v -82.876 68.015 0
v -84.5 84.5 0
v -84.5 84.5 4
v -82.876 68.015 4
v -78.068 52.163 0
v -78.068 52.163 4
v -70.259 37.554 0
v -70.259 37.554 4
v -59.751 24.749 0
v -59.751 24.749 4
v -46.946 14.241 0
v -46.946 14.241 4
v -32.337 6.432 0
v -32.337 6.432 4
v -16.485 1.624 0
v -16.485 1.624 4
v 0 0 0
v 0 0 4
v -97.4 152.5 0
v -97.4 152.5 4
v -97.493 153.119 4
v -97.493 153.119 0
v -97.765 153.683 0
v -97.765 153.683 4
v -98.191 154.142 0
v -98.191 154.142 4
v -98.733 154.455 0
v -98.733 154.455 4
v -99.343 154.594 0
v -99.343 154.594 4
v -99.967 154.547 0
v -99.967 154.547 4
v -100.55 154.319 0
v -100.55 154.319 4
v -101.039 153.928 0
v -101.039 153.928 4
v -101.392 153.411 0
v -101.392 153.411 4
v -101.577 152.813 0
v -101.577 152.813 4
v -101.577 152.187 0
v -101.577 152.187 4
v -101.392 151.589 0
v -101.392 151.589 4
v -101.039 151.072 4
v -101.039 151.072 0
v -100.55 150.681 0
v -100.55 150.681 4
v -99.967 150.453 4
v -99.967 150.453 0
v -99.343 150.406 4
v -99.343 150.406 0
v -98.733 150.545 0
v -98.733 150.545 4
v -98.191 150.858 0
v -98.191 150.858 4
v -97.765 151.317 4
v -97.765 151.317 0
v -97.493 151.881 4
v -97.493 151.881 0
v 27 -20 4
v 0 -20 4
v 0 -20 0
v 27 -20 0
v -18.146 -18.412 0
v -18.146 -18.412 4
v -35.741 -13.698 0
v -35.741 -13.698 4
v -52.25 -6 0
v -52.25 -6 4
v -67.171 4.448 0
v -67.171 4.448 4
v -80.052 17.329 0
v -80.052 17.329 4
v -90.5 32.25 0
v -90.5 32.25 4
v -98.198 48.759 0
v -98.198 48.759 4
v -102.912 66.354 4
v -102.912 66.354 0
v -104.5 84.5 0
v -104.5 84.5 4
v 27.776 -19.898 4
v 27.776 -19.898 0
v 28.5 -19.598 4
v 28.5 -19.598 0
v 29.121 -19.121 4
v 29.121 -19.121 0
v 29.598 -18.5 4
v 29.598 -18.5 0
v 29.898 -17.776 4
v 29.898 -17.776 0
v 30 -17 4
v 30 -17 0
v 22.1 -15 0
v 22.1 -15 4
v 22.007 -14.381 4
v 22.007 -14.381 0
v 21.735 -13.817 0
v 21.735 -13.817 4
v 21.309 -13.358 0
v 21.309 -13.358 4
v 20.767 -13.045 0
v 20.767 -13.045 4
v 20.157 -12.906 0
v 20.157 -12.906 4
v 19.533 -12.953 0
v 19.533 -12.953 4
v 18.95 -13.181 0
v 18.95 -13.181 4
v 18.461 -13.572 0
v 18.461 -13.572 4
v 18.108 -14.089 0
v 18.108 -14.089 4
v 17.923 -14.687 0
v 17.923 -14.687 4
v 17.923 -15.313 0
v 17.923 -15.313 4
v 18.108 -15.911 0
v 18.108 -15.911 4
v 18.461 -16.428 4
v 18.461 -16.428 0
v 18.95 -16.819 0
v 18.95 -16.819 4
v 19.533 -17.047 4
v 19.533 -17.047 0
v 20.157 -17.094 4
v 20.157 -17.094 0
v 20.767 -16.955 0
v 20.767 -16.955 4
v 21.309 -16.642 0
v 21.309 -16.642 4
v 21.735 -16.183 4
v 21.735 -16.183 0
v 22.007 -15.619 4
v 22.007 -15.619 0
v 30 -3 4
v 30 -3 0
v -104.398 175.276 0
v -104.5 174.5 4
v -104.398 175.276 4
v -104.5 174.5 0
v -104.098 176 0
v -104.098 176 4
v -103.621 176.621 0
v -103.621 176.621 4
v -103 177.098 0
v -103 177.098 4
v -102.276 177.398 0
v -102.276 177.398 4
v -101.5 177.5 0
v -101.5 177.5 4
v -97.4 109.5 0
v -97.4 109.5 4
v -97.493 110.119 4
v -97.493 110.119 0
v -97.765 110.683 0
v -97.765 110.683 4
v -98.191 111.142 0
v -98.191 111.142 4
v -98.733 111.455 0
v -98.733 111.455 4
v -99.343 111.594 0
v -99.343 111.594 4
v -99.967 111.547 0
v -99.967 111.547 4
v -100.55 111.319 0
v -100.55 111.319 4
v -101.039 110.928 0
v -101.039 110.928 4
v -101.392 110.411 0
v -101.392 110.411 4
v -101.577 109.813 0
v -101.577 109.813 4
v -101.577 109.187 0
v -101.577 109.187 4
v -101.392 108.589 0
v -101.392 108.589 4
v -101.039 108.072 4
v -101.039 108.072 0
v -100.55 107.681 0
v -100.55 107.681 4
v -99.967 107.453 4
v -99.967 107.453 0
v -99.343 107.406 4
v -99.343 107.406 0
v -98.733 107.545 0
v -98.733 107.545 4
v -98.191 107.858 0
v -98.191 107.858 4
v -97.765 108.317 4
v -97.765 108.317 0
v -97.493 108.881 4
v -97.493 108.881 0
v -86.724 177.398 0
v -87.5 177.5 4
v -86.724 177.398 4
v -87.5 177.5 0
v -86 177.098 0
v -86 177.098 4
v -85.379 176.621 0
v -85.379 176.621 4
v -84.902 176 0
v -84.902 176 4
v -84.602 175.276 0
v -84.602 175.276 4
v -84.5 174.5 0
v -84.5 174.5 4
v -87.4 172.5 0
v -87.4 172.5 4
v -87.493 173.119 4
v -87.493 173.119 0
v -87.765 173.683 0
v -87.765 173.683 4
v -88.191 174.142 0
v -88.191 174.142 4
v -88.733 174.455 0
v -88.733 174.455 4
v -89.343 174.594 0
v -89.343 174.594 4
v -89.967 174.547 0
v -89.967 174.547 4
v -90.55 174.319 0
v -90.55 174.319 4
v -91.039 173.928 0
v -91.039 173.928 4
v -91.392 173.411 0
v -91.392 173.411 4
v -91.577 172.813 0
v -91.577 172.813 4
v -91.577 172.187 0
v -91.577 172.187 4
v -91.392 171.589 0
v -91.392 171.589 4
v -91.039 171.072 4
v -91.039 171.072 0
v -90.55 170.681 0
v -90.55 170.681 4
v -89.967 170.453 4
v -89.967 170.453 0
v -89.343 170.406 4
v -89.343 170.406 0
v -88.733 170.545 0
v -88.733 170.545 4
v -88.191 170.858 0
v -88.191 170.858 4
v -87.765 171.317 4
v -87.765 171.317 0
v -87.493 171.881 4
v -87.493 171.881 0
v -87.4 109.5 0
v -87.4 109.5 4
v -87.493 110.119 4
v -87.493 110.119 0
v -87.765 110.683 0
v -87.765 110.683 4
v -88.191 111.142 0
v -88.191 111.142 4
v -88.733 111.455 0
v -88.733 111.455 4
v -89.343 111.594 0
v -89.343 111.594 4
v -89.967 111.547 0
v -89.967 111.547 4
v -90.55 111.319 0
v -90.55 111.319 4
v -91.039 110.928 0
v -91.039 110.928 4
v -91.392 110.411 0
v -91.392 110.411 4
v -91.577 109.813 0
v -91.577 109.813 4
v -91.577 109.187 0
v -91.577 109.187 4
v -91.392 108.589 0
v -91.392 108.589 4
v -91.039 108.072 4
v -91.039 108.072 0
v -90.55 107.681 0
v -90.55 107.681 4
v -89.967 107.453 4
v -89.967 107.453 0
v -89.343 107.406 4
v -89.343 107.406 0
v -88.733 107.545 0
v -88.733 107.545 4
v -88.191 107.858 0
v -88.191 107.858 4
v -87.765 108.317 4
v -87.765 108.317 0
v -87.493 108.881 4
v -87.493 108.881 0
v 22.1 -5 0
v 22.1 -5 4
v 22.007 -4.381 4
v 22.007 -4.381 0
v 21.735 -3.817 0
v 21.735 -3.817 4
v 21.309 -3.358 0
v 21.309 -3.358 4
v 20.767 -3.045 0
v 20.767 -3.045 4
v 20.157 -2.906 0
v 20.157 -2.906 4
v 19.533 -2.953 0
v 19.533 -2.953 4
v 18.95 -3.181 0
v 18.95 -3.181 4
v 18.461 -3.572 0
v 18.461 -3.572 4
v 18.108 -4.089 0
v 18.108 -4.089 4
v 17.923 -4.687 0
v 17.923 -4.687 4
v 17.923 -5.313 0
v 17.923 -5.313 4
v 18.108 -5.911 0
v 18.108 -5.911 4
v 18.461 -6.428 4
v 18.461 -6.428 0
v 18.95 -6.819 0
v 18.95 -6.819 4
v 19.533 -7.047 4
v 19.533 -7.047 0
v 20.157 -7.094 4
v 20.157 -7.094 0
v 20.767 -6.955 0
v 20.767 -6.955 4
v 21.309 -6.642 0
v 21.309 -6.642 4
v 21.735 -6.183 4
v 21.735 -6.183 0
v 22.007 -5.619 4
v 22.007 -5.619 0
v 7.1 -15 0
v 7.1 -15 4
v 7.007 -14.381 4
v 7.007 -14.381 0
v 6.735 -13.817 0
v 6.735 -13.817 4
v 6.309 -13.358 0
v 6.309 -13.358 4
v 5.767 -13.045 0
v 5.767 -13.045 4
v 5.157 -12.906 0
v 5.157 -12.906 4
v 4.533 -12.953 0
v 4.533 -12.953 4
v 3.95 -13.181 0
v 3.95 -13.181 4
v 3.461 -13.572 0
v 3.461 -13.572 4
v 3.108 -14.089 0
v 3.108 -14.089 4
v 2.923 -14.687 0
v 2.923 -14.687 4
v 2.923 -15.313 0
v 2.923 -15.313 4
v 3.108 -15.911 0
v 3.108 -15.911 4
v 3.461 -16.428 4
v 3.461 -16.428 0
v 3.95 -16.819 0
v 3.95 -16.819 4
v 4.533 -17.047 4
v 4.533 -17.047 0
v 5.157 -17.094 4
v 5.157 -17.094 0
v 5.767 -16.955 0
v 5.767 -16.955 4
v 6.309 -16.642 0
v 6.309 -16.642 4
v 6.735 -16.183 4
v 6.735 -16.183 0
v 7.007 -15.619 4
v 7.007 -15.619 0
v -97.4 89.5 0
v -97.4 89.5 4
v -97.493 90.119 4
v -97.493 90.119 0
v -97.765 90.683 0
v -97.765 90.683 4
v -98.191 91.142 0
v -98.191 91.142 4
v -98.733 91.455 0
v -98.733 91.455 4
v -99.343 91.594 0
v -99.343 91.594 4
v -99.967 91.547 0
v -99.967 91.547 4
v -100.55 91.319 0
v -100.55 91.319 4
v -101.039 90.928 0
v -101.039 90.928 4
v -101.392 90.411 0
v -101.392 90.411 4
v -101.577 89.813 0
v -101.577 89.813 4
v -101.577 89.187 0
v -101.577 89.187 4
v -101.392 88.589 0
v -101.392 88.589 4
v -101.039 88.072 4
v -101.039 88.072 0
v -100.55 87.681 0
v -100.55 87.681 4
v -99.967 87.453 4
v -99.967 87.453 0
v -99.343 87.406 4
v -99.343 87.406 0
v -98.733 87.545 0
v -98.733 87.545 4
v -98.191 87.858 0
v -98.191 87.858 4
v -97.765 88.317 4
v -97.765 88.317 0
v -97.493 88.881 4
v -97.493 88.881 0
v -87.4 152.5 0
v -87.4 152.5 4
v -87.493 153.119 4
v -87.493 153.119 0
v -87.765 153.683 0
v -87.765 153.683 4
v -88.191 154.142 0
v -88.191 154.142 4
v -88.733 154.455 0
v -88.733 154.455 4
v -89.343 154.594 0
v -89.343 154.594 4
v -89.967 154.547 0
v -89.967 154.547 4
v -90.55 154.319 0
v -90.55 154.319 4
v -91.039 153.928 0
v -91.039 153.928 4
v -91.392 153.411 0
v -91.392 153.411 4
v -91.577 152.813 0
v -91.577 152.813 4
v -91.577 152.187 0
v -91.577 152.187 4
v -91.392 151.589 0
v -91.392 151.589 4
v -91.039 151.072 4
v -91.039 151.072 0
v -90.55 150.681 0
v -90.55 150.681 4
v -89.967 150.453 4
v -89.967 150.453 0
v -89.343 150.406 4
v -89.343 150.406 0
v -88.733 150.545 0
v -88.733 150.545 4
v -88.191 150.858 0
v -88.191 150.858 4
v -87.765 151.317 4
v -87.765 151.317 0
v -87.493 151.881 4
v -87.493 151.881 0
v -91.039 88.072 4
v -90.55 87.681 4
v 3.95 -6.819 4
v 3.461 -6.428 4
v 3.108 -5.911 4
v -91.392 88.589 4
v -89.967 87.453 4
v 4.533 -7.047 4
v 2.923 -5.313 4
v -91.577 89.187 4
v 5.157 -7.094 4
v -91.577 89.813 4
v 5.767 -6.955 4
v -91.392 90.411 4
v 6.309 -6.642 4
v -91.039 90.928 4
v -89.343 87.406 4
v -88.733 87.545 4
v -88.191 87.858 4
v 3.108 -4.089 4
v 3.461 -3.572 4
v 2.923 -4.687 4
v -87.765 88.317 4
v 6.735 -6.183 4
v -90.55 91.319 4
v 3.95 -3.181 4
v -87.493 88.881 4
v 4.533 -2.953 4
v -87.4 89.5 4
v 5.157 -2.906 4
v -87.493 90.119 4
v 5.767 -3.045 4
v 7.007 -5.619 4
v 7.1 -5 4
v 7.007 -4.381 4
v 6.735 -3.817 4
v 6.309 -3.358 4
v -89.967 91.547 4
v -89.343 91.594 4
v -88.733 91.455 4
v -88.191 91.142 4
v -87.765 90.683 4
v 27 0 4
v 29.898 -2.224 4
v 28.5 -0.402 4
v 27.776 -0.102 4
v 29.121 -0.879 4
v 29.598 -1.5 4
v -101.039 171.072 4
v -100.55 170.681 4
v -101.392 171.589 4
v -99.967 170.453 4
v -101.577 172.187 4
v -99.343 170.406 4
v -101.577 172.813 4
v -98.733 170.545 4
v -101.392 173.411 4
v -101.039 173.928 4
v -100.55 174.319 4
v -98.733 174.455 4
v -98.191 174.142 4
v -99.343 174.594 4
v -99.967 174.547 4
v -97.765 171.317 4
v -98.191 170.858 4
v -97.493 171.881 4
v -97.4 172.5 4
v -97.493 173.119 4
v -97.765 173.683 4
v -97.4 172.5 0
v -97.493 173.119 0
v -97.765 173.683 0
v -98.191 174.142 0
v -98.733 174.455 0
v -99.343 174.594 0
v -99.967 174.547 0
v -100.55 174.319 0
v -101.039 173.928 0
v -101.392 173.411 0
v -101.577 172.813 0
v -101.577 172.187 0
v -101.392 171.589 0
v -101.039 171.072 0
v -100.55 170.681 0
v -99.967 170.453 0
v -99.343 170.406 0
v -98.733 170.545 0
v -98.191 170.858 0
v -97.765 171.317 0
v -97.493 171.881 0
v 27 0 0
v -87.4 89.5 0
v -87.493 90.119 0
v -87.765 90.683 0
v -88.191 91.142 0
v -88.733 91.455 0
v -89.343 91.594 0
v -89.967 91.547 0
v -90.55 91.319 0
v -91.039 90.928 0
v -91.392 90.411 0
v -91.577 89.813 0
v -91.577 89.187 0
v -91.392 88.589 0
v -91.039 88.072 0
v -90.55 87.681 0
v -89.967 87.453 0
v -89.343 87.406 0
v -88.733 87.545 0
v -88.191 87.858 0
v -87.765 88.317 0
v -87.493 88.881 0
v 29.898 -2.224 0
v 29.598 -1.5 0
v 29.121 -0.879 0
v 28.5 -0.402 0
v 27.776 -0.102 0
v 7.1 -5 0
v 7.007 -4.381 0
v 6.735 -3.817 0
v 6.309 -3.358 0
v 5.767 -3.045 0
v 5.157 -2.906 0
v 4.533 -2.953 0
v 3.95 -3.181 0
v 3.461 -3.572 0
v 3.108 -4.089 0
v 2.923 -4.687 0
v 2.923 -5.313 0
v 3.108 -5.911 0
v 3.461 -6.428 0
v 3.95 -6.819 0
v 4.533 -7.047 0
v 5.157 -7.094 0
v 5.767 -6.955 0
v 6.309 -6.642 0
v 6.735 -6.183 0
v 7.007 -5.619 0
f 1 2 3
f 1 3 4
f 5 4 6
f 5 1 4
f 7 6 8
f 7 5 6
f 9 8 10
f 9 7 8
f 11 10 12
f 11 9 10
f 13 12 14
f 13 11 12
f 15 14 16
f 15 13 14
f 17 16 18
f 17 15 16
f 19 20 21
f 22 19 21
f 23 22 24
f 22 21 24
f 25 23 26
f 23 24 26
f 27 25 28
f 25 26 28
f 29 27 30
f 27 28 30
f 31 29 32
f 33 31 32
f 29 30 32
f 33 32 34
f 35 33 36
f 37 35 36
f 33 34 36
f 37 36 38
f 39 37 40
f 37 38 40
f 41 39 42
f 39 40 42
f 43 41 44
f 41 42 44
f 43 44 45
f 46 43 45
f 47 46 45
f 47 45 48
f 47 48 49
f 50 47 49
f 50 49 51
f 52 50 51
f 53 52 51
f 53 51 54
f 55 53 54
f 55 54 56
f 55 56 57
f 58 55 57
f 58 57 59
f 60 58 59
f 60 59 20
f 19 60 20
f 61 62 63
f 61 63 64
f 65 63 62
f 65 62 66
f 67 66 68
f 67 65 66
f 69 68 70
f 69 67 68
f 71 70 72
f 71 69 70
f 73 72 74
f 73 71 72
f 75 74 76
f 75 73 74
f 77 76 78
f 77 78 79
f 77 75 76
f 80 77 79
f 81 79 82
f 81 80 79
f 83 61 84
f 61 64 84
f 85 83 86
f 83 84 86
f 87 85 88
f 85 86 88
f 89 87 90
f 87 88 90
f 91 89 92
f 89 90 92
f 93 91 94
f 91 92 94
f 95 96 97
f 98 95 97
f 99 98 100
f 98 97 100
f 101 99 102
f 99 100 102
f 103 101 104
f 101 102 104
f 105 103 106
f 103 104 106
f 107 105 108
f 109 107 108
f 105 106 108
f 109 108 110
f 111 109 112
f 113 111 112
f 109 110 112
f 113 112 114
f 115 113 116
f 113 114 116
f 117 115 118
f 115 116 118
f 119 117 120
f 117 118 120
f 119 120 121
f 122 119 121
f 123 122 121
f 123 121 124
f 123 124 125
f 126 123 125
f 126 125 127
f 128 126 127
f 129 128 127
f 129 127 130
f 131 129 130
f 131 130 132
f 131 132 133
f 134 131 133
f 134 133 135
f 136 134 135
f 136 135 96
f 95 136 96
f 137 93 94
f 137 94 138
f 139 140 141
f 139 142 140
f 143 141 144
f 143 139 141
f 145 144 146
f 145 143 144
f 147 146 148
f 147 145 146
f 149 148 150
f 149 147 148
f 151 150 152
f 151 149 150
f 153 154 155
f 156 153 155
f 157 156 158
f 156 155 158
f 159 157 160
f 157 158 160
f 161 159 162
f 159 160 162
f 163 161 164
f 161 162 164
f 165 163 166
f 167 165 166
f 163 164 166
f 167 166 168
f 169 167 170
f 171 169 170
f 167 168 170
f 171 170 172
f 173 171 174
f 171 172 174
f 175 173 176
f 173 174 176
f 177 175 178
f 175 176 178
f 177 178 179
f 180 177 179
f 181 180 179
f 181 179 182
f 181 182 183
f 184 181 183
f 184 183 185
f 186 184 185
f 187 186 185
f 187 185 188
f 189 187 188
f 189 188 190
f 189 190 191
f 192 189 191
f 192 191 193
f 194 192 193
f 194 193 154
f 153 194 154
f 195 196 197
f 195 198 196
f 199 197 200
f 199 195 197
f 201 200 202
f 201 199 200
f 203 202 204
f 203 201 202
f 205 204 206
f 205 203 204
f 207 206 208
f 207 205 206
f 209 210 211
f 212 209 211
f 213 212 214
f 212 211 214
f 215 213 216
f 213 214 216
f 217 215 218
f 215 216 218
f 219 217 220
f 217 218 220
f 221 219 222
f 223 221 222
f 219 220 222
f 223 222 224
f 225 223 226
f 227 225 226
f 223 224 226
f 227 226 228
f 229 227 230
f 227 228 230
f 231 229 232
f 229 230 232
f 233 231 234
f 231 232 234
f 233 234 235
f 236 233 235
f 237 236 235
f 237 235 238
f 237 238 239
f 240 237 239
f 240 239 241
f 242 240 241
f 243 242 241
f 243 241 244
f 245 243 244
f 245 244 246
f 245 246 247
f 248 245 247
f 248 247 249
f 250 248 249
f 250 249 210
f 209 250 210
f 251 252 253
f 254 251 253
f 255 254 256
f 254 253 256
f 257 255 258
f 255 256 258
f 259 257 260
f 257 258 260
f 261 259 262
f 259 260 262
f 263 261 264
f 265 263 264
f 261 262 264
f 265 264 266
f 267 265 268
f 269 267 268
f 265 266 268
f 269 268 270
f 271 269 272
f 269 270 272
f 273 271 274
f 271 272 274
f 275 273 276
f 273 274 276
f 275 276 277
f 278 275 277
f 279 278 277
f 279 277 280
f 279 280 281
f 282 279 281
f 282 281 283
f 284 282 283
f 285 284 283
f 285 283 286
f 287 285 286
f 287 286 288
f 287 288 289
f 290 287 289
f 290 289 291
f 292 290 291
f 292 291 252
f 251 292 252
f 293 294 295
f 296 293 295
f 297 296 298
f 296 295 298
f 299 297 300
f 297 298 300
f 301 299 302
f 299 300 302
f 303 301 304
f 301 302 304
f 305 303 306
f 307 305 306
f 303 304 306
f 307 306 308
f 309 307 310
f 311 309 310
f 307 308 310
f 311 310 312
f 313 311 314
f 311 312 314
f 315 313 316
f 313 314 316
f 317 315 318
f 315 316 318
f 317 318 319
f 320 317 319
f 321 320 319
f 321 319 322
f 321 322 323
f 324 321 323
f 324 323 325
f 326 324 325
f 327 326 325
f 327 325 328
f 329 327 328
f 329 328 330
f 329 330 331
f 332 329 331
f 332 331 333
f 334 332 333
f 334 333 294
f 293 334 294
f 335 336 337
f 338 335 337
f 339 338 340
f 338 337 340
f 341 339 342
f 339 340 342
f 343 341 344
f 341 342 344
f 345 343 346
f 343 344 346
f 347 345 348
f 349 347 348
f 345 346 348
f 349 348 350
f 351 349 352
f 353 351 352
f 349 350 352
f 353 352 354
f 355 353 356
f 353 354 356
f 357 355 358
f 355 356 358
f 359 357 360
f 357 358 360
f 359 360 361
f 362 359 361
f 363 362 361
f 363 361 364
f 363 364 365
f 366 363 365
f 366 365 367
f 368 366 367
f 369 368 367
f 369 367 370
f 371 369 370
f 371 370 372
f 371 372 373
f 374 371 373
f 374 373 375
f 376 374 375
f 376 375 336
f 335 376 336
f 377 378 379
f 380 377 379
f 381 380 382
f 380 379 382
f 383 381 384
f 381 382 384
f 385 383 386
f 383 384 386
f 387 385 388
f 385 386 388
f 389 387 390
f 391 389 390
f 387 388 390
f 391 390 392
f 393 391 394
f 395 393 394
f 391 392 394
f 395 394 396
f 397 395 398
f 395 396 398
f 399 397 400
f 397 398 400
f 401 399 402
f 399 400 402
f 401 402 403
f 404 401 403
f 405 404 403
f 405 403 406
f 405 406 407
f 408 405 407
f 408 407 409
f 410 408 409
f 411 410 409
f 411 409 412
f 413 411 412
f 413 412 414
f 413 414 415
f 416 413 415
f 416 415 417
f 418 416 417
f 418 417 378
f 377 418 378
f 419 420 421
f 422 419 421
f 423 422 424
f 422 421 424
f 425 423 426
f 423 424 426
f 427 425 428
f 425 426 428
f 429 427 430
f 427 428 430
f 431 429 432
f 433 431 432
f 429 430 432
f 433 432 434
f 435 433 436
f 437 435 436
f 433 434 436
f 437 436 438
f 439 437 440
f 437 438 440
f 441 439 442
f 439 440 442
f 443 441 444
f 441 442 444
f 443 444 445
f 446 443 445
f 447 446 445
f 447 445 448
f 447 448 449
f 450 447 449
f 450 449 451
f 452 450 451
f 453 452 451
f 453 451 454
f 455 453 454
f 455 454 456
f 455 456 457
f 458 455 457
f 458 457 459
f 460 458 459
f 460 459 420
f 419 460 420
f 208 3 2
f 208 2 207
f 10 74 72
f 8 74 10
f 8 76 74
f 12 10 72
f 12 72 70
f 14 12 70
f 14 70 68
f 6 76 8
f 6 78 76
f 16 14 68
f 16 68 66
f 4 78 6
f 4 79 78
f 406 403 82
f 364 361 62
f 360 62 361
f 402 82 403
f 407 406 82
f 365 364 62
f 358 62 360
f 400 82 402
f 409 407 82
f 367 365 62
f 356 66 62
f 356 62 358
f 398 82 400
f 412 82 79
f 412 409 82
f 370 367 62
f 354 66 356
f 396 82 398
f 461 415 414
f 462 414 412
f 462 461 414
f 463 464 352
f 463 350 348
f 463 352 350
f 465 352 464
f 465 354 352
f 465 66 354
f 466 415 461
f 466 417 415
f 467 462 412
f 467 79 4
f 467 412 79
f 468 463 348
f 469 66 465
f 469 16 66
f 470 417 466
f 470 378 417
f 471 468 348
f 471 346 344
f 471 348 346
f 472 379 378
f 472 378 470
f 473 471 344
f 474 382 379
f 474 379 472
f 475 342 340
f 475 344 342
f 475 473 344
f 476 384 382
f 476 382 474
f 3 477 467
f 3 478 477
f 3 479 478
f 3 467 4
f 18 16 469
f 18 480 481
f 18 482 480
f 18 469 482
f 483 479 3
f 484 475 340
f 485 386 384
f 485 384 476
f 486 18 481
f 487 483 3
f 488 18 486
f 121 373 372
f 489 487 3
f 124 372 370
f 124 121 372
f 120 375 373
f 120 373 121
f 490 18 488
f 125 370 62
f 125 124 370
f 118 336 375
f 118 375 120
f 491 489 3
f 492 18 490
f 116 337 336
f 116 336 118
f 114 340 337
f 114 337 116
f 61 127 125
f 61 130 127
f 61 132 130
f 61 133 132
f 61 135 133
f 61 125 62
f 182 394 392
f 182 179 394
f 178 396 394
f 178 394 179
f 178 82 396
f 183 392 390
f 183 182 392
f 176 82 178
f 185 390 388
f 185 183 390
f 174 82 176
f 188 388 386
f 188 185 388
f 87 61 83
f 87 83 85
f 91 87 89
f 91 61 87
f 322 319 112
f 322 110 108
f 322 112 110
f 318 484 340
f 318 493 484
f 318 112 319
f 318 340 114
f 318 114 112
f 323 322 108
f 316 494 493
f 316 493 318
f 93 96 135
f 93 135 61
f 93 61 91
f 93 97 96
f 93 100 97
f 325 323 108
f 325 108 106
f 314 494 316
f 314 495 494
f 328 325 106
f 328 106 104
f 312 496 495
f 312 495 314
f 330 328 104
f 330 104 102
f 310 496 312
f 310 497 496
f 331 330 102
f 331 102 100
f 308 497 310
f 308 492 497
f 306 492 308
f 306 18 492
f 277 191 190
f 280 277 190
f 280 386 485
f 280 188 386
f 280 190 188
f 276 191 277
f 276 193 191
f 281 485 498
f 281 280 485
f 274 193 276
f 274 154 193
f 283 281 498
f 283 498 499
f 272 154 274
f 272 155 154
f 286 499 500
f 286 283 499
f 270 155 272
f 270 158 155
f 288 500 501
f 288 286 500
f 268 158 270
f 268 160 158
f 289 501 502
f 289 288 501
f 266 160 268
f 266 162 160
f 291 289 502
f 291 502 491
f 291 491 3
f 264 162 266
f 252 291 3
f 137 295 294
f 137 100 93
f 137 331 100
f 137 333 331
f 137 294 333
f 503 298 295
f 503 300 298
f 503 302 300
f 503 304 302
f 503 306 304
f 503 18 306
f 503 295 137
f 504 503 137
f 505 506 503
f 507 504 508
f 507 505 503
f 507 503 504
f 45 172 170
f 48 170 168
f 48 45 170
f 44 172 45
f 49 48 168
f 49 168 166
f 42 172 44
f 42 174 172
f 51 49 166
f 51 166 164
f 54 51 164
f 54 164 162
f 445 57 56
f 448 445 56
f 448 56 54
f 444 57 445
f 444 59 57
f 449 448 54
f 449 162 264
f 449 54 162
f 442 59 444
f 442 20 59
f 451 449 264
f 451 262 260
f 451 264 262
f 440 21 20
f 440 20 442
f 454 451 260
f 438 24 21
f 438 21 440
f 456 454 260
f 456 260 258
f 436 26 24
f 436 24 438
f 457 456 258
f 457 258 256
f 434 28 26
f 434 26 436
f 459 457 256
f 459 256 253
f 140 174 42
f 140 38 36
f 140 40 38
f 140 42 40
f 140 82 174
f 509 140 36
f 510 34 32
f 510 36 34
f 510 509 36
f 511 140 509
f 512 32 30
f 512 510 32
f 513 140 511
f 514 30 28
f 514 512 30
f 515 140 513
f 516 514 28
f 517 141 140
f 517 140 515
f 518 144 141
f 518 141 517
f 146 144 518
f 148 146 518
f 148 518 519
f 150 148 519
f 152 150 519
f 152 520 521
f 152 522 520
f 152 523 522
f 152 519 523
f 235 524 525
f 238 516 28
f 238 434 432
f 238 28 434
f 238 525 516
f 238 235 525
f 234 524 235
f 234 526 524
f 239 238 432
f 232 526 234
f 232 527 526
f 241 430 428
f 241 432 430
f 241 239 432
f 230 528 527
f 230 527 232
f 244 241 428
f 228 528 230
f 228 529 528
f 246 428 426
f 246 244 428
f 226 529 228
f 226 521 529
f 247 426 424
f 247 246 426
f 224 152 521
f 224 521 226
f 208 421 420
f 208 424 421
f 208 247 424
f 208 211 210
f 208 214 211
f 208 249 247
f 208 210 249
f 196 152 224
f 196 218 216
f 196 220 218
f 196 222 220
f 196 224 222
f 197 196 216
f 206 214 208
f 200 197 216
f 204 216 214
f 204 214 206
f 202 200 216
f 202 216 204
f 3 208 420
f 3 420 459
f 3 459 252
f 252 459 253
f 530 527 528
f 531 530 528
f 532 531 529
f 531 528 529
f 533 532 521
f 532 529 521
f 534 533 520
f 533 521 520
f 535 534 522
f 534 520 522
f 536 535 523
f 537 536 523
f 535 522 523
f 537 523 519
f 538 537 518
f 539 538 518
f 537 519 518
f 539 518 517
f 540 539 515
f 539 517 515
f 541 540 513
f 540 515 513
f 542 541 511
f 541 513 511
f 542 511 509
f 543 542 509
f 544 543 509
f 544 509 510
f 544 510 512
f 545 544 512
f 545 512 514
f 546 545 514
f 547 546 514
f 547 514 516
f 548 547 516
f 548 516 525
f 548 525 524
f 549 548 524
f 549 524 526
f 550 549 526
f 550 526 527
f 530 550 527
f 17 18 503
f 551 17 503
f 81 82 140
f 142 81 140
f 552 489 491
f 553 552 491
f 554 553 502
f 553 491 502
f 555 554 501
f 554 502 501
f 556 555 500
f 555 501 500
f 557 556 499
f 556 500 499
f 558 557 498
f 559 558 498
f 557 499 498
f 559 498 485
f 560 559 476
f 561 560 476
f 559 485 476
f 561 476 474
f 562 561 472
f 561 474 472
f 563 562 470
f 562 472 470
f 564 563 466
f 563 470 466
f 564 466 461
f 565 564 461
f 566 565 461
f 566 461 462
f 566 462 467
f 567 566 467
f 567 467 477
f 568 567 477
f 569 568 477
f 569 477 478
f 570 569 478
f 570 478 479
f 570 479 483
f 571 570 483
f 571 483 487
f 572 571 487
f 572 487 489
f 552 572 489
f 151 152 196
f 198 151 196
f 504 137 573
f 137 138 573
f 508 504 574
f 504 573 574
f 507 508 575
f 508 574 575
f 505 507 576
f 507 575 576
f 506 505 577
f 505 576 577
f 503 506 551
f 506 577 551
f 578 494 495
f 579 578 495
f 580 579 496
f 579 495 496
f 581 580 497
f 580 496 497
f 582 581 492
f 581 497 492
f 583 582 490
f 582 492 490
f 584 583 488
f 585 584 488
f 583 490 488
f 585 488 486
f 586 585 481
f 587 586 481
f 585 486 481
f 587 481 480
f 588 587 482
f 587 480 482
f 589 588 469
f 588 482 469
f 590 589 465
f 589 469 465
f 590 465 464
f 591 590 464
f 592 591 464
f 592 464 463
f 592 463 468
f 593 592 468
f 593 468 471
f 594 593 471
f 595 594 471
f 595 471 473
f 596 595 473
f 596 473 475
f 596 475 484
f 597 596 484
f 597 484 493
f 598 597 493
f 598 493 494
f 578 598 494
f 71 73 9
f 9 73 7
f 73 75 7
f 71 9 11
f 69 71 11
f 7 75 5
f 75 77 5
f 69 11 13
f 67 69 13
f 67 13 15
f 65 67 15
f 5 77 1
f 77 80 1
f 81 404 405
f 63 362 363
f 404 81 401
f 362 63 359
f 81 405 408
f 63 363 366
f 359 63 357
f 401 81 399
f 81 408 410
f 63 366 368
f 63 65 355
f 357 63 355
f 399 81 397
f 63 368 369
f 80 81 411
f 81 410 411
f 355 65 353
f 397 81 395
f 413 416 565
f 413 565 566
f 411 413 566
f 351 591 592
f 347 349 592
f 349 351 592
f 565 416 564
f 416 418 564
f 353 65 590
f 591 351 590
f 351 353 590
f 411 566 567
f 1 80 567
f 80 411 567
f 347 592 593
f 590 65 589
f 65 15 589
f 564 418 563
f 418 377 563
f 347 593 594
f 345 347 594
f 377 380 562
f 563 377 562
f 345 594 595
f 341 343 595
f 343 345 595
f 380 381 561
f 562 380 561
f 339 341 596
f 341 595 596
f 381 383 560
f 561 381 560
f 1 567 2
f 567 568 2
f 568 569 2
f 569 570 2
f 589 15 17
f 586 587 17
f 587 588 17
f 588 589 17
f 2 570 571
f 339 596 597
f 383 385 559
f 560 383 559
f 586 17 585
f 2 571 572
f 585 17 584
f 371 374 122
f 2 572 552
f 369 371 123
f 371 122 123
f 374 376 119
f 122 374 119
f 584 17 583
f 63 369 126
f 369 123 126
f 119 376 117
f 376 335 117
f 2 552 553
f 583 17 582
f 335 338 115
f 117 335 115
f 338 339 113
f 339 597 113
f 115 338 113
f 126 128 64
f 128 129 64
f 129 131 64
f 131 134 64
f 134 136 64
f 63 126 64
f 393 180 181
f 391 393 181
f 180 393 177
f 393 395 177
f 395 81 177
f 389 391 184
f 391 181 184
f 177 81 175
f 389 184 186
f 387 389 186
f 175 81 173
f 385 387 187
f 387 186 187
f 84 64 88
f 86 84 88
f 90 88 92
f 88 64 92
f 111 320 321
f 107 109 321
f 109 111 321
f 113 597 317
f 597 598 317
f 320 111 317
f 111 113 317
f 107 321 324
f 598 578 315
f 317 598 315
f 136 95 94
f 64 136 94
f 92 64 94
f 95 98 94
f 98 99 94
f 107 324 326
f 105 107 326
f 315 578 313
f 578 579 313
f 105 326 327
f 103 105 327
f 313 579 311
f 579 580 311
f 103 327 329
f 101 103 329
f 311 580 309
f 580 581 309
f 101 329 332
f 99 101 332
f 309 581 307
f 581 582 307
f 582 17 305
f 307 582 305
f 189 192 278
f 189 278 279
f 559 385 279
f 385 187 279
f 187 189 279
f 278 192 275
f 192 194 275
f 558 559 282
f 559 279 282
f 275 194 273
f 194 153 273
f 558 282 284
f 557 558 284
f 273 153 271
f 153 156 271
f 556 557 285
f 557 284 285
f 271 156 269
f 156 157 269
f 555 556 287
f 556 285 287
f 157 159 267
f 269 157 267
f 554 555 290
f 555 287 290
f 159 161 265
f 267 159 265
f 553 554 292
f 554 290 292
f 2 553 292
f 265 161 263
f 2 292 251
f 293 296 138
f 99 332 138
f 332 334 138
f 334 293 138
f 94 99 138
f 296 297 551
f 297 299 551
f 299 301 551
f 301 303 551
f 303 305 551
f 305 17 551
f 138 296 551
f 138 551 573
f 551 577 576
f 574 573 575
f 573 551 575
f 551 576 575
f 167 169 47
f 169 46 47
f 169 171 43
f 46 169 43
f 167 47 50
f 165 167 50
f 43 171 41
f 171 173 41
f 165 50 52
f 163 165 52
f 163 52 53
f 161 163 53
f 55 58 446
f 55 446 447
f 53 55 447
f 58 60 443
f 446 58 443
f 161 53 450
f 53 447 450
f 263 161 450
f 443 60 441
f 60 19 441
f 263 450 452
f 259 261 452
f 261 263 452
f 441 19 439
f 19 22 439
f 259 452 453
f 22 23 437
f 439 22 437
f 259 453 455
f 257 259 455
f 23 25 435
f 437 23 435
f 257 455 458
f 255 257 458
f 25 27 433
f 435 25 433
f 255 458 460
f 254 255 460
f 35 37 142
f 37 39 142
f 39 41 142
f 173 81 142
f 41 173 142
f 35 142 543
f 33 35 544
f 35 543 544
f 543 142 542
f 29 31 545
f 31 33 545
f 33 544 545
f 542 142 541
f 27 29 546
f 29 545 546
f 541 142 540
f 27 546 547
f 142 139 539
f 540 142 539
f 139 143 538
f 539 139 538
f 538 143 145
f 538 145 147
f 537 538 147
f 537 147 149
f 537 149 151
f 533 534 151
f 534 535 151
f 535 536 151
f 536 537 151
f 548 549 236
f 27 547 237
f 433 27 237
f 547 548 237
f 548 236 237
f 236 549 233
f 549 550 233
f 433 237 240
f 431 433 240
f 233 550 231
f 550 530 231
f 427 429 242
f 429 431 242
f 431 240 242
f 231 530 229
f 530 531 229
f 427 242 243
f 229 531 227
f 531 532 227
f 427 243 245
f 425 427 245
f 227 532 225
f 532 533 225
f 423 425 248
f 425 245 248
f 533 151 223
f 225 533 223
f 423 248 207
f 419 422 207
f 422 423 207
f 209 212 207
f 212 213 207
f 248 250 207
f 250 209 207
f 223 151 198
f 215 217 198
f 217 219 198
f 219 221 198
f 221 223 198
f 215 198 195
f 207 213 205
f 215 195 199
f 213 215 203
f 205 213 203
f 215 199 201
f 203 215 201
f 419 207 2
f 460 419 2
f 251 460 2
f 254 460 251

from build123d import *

# Parameters (mm, degrees)
EXTRUDE_1_DEPTH     = 4
SKETCH_5_W          = 20
SKETCH_5_H          = 93
EXTRUDE_4_DEPTH     = 4
SKETCH_6_W          = 30
SKETCH_6_H          = 20
EXTRUDE_5_DEPTH     = 4
SKETCH_7_R          = 2.1
CUT_EXTRUDE_2_DEPTH = 5
FILLET_2_R          = 3


with BuildPart() as part:
    # 草图1 → 凸台-拉伸1 (new body)
    with BuildSketch(Plane.XY):
        with BuildLine():
            Line((0, 0), (0, -20))
            ThreePointArc((0, -20), (-73.892658634, 10.607341366), (-104.5, 84.5))
            Line((-104.5, 84.5), (-84.5, 84.5))
            ThreePointArc((-84.5, 84.5), (-59.75052301, 24.74947699), (0, 0))
        make_face()
    extrude(amount=EXTRUDE_1_DEPTH)

    # 草图5 → 凸台-拉伸4 (add)
    with BuildSketch(Plane.XY.offset(4)):
        with Locations((-94.5, 131)):
            Rectangle(SKETCH_5_W, SKETCH_5_H)
    extrude(amount=-EXTRUDE_4_DEPTH)

    # 草图6 → 凸台-拉伸5 (add)
    with BuildSketch(Plane.XY.offset(4)):
        with Locations((15, -10)):
            Rectangle(SKETCH_6_W, SKETCH_6_H)
    extrude(amount=-EXTRUDE_5_DEPTH)

    # 草图7 → 切除-拉伸2 (cut, through all)
    with BuildSketch(Plane.XY.offset(4)):
        with Locations((-99.5, 109.5)):
            Circle(SKETCH_7_R)
        with Locations((-89.5, 109.5)):
            Circle(SKETCH_7_R)
        with Locations((-89.5, 89.5)):
            Circle(SKETCH_7_R)
        with Locations((-99.5, 89.5)):
            Circle(SKETCH_7_R)
        with Locations((-99.5, 152.5)):
            Circle(SKETCH_7_R)
        with Locations((-89.5, 152.5)):
            Circle(SKETCH_7_R)
        with Locations((-89.5, 172.5)):
            Circle(SKETCH_7_R)
        with Locations((-99.5, 172.5)):
            Circle(SKETCH_7_R)
        with Locations((20, -15)):
            Circle(SKETCH_7_R)
        with Locations((20, -5)):
            Circle(SKETCH_7_R)
        with Locations((5, -5)):
            Circle(SKETCH_7_R)
        with Locations((5, -15)):
            Circle(SKETCH_7_R)
    extrude(amount=-CUT_EXTRUDE_2_DEPTH, mode=Mode.SUBTRACT)

    # 圆角2
    fillet_2_edges = [part.edges().sort_by_distance(p)[0] for p in [
        (-104.5, 177.5, 2),
        (-84.5, 177.5, 2),
        (30, 0, 2),
        (30, -20, 2),
    ]]
    fillet(fillet_2_edges, radius=FILLET_2_R)


solid = part.part
